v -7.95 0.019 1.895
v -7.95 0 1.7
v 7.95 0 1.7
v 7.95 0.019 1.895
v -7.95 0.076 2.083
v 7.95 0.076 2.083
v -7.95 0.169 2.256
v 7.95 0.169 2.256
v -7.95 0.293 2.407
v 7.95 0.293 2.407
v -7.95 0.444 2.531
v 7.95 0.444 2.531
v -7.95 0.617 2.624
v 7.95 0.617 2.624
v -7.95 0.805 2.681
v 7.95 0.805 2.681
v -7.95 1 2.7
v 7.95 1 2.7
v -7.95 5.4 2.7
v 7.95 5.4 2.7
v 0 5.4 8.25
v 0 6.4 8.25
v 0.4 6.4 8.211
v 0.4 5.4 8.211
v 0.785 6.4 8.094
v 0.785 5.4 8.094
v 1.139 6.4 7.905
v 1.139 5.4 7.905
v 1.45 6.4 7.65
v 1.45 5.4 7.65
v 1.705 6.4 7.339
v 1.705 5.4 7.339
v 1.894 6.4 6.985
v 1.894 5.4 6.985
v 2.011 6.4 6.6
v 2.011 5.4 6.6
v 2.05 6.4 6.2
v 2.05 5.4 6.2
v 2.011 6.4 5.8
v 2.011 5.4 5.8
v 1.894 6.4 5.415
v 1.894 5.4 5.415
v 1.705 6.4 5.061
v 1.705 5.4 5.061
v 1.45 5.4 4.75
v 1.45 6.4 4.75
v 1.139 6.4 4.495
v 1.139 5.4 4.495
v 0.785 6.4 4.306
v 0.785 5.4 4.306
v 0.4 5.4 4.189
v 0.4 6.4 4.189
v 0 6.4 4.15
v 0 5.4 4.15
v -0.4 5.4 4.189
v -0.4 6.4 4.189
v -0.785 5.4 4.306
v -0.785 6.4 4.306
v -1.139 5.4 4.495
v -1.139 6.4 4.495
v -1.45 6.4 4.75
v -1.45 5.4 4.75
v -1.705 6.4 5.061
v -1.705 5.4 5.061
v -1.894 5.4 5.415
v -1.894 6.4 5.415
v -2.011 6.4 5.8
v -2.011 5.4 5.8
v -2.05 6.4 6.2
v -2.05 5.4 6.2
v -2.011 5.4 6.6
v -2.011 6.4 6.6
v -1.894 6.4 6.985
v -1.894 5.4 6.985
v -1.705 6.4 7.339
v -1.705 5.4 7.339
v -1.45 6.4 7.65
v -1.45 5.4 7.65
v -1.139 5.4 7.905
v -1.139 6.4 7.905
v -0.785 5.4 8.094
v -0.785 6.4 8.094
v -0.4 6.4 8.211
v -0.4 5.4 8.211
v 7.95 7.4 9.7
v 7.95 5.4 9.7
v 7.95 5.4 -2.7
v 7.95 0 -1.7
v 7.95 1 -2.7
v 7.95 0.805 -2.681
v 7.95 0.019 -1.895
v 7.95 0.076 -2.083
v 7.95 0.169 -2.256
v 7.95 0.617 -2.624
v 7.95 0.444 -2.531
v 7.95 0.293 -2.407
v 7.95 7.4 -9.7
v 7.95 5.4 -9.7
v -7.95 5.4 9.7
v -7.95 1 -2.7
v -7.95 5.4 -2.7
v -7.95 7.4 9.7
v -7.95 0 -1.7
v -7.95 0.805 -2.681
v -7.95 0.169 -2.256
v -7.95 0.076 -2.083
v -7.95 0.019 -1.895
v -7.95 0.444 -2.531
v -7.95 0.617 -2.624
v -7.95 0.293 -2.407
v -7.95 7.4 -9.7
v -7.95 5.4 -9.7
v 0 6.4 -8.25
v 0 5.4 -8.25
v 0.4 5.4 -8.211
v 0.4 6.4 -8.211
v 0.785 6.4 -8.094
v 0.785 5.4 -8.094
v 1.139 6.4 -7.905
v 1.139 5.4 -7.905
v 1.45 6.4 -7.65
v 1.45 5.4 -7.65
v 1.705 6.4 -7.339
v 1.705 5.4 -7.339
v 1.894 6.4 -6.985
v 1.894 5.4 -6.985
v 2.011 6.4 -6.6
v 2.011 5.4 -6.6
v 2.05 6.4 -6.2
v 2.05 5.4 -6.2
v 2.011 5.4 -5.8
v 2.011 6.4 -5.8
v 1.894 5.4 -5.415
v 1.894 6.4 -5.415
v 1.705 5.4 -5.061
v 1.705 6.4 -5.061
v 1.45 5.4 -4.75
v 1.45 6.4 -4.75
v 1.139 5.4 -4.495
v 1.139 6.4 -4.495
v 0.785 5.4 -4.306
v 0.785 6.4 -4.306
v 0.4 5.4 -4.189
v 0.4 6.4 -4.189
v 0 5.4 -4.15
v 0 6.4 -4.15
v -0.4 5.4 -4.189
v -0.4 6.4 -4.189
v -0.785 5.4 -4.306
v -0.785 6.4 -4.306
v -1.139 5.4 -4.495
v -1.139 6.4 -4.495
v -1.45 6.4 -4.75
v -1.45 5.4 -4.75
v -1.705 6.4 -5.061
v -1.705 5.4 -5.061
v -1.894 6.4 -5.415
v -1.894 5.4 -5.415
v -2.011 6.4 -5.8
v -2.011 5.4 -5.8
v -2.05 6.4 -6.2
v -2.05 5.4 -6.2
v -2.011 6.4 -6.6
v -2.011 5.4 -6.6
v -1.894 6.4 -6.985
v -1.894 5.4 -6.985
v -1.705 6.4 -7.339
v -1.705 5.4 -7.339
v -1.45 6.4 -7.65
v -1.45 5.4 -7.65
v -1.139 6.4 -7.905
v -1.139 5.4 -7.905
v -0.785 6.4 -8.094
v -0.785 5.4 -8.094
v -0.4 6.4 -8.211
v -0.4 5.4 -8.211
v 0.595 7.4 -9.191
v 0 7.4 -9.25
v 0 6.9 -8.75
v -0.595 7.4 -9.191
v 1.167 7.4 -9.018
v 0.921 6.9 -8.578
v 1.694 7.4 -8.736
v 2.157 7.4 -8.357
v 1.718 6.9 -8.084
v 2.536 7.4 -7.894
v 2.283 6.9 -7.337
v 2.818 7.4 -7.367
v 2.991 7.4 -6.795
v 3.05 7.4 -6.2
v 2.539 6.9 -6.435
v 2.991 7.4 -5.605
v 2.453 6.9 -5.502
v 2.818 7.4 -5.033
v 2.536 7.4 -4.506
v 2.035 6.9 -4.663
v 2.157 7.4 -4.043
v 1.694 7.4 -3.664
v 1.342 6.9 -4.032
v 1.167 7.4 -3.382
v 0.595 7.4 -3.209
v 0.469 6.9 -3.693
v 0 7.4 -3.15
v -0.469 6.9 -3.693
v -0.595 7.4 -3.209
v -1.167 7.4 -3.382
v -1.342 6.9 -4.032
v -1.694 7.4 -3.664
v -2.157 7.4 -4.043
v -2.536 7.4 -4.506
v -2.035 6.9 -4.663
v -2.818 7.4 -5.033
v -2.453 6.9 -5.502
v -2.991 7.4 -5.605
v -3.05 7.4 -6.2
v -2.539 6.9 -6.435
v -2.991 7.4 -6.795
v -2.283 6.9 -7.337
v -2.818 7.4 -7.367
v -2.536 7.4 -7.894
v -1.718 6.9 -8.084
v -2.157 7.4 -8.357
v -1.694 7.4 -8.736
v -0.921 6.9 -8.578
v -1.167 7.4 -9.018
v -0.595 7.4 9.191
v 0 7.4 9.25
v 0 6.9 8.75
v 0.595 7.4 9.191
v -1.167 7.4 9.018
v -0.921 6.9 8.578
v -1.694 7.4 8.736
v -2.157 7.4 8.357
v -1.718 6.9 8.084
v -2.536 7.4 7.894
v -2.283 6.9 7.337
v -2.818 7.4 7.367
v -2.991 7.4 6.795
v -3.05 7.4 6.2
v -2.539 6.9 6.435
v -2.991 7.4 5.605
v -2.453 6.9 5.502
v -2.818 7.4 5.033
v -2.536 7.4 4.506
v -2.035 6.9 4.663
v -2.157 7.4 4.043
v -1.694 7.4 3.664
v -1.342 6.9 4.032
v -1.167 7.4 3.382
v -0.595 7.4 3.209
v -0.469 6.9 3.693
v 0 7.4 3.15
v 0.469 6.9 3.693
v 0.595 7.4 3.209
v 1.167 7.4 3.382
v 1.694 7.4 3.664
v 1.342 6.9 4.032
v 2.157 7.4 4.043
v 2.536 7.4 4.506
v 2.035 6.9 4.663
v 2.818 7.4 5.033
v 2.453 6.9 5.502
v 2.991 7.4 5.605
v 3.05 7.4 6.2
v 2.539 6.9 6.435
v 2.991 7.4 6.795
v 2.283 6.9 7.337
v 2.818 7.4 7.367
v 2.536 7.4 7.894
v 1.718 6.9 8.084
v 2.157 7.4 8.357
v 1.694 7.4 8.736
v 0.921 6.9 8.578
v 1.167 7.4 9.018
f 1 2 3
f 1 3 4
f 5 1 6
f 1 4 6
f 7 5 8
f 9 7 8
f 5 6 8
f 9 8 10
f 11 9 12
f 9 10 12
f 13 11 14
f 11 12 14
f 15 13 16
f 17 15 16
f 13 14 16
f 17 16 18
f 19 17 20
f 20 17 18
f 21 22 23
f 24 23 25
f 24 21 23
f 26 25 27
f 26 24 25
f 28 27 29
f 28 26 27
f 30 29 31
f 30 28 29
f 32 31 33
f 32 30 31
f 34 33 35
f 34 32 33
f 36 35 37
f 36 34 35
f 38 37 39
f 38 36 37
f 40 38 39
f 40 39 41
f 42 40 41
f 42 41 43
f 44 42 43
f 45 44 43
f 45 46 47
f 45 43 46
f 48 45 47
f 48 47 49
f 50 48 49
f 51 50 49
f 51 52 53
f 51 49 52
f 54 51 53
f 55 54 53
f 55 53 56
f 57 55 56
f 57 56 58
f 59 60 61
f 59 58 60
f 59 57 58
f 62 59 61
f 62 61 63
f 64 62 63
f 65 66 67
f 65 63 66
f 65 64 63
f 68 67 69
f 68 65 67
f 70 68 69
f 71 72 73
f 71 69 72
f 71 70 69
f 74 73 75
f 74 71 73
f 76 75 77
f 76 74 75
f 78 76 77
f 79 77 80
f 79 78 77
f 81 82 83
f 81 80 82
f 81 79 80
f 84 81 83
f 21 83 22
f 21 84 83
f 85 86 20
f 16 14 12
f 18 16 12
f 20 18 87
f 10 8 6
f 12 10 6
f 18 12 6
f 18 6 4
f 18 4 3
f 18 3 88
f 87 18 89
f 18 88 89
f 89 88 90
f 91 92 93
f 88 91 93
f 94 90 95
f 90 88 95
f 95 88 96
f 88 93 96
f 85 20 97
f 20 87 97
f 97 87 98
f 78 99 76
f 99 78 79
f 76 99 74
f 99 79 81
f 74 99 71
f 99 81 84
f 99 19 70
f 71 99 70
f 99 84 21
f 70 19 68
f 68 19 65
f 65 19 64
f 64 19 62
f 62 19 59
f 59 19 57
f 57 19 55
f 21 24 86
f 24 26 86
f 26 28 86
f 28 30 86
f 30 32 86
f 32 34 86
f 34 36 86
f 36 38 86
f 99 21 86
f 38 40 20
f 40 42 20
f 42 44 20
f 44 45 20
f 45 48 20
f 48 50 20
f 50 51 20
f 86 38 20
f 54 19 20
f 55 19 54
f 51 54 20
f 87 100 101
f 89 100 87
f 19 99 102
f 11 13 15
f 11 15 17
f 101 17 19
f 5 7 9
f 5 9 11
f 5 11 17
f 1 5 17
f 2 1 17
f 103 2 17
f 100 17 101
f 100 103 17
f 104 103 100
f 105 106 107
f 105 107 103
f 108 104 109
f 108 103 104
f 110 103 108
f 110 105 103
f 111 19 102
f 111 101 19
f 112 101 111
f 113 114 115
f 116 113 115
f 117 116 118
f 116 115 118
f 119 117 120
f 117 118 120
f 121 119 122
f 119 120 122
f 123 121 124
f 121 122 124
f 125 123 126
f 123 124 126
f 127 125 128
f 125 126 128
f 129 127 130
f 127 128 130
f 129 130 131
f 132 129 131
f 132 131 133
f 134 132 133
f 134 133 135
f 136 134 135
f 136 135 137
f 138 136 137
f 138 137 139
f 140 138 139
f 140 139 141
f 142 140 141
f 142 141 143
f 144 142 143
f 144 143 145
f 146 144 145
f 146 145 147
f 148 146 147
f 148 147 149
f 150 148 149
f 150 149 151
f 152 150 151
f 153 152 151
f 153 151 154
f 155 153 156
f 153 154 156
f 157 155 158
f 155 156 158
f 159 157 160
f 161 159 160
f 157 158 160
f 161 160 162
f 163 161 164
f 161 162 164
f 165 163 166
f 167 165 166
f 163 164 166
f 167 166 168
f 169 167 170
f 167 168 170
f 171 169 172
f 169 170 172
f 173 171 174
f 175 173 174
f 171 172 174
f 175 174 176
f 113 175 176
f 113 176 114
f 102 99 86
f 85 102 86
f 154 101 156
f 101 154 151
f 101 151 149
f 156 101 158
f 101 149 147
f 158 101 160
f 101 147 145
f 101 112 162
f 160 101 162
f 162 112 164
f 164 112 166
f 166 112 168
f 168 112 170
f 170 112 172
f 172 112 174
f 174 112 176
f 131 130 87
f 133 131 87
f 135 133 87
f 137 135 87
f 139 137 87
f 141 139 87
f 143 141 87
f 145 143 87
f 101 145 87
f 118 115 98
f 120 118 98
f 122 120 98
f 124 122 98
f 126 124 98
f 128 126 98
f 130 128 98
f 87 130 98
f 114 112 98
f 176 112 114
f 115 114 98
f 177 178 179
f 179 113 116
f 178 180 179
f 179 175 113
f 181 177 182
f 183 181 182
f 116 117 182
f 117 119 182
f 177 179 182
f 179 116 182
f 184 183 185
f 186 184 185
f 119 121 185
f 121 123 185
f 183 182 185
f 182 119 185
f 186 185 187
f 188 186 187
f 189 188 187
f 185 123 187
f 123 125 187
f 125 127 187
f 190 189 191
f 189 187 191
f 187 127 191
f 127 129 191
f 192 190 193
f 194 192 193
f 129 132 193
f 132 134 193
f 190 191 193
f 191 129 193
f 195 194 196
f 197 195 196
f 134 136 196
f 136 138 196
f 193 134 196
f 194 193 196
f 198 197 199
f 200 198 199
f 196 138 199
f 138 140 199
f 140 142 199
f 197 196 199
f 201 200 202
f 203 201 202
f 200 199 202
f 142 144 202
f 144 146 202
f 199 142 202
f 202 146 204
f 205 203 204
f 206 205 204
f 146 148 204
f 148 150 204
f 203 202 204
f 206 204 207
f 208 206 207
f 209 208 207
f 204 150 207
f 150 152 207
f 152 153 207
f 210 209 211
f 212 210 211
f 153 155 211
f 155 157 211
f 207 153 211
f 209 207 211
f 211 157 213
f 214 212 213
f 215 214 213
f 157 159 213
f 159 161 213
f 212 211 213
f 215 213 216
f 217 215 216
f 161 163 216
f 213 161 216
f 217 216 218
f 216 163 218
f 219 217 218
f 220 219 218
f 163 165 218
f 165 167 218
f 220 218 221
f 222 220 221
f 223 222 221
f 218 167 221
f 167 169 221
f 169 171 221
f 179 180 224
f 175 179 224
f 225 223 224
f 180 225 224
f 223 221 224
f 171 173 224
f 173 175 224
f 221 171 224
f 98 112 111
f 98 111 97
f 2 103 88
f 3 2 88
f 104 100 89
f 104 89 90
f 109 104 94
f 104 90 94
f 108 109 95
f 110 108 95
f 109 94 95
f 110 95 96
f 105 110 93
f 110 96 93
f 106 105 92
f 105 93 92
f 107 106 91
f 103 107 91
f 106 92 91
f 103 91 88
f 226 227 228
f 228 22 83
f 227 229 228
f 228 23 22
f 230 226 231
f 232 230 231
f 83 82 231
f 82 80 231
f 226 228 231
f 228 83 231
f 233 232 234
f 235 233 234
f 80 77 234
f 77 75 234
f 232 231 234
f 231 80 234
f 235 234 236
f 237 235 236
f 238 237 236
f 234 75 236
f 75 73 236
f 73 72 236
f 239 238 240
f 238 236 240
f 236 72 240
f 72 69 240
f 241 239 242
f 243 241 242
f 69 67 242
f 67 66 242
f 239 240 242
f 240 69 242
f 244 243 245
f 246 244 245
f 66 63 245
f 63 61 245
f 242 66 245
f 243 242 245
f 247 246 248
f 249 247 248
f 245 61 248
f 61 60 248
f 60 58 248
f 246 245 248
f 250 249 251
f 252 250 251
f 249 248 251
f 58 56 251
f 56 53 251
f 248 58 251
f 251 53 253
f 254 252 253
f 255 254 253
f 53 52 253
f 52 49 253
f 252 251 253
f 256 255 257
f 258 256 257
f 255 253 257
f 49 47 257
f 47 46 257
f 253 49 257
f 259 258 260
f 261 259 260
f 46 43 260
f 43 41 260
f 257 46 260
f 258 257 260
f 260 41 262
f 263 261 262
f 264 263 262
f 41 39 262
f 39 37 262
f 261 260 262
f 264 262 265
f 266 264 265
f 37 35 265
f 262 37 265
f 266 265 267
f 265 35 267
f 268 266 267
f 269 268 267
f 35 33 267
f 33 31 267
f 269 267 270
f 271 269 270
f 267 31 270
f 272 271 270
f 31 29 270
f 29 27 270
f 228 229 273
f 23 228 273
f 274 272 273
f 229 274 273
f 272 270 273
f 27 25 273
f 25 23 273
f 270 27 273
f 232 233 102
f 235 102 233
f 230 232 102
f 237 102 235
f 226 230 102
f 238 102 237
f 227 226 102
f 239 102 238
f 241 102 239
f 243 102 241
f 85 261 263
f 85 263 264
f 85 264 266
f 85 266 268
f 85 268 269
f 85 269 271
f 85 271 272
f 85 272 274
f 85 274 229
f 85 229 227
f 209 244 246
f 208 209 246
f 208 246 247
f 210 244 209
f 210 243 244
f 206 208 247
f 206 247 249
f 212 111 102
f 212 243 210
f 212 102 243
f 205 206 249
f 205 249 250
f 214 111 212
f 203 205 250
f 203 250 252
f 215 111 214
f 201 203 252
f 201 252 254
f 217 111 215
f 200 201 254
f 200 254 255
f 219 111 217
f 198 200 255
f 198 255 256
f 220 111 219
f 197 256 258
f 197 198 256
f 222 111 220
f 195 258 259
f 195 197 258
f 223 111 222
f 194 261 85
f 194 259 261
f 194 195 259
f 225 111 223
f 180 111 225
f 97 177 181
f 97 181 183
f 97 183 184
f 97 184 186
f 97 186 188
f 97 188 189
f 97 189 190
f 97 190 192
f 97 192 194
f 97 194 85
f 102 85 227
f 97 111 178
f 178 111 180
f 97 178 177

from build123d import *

# Parameters (mm, degrees)
SKETCH_1_W          = 15.9
SKETCH_1_H          = 5.4
EXTRUDE_1_DEPTH     = 5.4
SKETCH_2_W          = 15.9
SKETCH_2_H          = 19.4
EXTRUDE_2_DEPTH     = 2
SKETCH_3_R          = 2.05
CUT_EXTRUDE_2_DEPTH = 14.654761074
CHAMFER_1_SIZE      = 1
FILLET_1_R          = 1


with BuildPart() as part:
    # 草图1 → 凸台-拉伸1 (new body)
    with BuildSketch(Plane(origin=(0, 0, 0), x_dir=(1, 0, 0), z_dir=(0, 1, 0))):
        Rectangle(SKETCH_1_W, SKETCH_1_H)
    extrude(amount=EXTRUDE_1_DEPTH)

    # 草图2 → 凸台-拉伸2 (add)
    with BuildSketch(Plane(origin=(0, 5.4, 0), x_dir=(1, 0, 0), z_dir=(0, 1, 0))):
        Rectangle(SKETCH_2_W, SKETCH_2_H)
    extrude(amount=EXTRUDE_2_DEPTH)

    # 草图3 → 切除-拉伸2 (cut, through all)
    with BuildSketch(Plane(origin=(0, 5.4, 0), x_dir=(-1, 0, 0), z_dir=(0, -1, 0))):
        with Locations(Location((0, 6.2, 0), (0, 0, 90))):
            Circle(SKETCH_3_R)
    cut_extrude_2 = extrude(amount=-CUT_EXTRUDE_2_DEPTH, mode=Mode.SUBTRACT)

    # 镜向2: 切除-拉伸2 across plane
    add(cut_extrude_2.mirror(Plane.XY), mode=Mode.SUBTRACT)

    # 倒角1
    chamfer_1_edges = [part.edges().sort_by_distance(p)[0] for p in [
        (0, 7.4, -4.15),
        (0, 7.4, 4.15),
    ]]
    chamfer(chamfer_1_edges, length=CHAMFER_1_SIZE)

    # 圆角1
    fillet_1_edges = [part.edges().sort_by_distance(p)[0] for p in [
        (0, 0, 2.7),
        (0, 0, -2.7),
    ]]
    fillet(fillet_1_edges, radius=FILLET_1_R)


solid = part.part
